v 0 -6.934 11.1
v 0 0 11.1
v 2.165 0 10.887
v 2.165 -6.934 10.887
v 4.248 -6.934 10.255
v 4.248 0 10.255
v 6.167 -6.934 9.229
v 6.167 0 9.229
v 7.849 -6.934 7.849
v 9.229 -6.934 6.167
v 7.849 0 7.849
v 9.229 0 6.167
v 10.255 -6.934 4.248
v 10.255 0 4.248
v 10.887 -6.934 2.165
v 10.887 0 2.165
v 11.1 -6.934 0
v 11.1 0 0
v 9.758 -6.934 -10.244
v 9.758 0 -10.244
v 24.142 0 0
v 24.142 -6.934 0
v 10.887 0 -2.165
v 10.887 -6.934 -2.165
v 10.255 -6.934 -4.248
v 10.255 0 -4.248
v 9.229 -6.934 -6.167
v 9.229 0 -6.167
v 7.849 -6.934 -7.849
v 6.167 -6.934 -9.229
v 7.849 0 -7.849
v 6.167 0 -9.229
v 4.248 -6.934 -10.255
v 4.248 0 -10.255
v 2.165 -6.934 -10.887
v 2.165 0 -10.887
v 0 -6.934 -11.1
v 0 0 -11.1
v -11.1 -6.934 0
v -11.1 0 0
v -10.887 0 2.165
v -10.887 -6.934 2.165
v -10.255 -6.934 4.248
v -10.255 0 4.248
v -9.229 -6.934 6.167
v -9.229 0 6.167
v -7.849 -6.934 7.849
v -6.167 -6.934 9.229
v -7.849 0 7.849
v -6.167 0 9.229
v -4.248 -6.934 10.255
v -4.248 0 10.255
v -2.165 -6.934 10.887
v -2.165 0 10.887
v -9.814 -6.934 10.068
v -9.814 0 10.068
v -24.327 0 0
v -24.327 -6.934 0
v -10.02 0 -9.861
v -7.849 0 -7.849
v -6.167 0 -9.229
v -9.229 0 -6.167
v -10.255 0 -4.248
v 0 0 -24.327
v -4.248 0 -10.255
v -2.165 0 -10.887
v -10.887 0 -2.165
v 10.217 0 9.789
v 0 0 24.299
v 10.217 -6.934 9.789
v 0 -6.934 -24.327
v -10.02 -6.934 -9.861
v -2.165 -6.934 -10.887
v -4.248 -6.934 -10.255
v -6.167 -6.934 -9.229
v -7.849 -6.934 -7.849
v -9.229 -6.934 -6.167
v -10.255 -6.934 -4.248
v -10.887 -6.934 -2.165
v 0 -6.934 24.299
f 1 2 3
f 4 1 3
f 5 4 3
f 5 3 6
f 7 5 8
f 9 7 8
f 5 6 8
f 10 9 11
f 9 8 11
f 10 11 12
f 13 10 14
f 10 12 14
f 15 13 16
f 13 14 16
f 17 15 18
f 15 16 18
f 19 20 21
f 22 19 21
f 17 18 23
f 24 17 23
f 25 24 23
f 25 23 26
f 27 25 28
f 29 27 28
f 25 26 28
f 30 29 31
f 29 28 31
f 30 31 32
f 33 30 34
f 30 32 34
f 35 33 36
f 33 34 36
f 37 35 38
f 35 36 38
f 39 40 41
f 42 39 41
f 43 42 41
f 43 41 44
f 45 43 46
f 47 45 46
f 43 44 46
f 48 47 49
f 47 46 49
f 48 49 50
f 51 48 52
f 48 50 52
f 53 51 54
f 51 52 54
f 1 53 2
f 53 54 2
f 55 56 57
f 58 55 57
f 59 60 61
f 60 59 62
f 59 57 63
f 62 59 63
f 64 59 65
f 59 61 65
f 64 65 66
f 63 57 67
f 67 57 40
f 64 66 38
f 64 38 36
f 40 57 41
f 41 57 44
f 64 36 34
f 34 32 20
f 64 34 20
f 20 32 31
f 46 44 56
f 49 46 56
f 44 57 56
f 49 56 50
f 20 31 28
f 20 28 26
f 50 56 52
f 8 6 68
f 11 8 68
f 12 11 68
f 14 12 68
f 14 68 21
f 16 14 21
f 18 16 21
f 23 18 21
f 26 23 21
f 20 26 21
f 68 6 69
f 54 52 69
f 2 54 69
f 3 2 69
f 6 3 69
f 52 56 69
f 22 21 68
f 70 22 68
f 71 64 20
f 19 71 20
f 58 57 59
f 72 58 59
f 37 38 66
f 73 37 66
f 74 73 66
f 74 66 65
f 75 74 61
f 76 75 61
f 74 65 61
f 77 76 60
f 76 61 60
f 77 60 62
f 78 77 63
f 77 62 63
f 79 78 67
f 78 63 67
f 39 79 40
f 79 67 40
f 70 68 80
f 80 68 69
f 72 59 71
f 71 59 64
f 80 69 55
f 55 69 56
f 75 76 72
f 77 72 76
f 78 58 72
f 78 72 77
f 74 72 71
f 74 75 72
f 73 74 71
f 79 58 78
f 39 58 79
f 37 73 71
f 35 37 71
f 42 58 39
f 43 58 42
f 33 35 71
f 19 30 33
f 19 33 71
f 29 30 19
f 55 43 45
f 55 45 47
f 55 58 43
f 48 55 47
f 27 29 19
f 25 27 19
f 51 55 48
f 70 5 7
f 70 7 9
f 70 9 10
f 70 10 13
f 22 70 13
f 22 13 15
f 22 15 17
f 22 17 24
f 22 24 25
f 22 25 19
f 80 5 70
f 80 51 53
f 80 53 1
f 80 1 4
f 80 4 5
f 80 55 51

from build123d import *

# Parameters (mm, degrees)
F1_DEPTH = 6.9342


with BuildPart() as f1:
    # F0 (on Front) → F1 (new body)
    with BuildSketch(Plane.XZ):
        with BuildLine():
            ThreePointArc((-11.0998, 0), (-7.848744, 7.848744), (0, 11.0998))
            Line((0, 11.0998), (0, 24.298547))
            Line((0, 24.298547), (-9.813829, 10.06805))
            Line((-9.813829, 10.06805), (-24.327461, 0))
            Line((-24.327461, 0), (-11.0998, 0))
        make_face()
        with BuildLine():
            Line((0, 24.298547), (0, 11.0998))
            ThreePointArc((0, 11.0998), (7.848744, 7.848744), (11.0998, 0))
            Line((11.0998, 0), (24.14246, 0))
            Line((24.14246, 0), (10.217335, 9.78862))
            Line((10.217335, 9.78862), (0, 24.298547))
        make_face()
        with BuildLine():
            ThreePointArc((0, -11.0998), (-7.848744, -7.848744), (-11.0998, 0))
            Line((-11.0998, 0), (-24.327461, 0))
            Line((-24.327461, 0), (-10.020223, -9.861334))
            Line((-10.020223, -9.861334), (0, -24.327463))
            Line((0, -24.327463), (0, -11.0998))
        make_face()
        with BuildLine():
            Line((24.14246, 0), (11.0998, 0))
            ThreePointArc((11.0998, 0), (7.848744, -7.848744), (0, -11.0998))
            Line((0, -11.0998), (0, -24.327463))
            Line((0, -24.327463), (9.758095, -10.243655))
            Line((9.758095, -10.243655), (24.14246, 0))
        make_face()
    extrude(amount=F1_DEPTH)


solid = f1.part
